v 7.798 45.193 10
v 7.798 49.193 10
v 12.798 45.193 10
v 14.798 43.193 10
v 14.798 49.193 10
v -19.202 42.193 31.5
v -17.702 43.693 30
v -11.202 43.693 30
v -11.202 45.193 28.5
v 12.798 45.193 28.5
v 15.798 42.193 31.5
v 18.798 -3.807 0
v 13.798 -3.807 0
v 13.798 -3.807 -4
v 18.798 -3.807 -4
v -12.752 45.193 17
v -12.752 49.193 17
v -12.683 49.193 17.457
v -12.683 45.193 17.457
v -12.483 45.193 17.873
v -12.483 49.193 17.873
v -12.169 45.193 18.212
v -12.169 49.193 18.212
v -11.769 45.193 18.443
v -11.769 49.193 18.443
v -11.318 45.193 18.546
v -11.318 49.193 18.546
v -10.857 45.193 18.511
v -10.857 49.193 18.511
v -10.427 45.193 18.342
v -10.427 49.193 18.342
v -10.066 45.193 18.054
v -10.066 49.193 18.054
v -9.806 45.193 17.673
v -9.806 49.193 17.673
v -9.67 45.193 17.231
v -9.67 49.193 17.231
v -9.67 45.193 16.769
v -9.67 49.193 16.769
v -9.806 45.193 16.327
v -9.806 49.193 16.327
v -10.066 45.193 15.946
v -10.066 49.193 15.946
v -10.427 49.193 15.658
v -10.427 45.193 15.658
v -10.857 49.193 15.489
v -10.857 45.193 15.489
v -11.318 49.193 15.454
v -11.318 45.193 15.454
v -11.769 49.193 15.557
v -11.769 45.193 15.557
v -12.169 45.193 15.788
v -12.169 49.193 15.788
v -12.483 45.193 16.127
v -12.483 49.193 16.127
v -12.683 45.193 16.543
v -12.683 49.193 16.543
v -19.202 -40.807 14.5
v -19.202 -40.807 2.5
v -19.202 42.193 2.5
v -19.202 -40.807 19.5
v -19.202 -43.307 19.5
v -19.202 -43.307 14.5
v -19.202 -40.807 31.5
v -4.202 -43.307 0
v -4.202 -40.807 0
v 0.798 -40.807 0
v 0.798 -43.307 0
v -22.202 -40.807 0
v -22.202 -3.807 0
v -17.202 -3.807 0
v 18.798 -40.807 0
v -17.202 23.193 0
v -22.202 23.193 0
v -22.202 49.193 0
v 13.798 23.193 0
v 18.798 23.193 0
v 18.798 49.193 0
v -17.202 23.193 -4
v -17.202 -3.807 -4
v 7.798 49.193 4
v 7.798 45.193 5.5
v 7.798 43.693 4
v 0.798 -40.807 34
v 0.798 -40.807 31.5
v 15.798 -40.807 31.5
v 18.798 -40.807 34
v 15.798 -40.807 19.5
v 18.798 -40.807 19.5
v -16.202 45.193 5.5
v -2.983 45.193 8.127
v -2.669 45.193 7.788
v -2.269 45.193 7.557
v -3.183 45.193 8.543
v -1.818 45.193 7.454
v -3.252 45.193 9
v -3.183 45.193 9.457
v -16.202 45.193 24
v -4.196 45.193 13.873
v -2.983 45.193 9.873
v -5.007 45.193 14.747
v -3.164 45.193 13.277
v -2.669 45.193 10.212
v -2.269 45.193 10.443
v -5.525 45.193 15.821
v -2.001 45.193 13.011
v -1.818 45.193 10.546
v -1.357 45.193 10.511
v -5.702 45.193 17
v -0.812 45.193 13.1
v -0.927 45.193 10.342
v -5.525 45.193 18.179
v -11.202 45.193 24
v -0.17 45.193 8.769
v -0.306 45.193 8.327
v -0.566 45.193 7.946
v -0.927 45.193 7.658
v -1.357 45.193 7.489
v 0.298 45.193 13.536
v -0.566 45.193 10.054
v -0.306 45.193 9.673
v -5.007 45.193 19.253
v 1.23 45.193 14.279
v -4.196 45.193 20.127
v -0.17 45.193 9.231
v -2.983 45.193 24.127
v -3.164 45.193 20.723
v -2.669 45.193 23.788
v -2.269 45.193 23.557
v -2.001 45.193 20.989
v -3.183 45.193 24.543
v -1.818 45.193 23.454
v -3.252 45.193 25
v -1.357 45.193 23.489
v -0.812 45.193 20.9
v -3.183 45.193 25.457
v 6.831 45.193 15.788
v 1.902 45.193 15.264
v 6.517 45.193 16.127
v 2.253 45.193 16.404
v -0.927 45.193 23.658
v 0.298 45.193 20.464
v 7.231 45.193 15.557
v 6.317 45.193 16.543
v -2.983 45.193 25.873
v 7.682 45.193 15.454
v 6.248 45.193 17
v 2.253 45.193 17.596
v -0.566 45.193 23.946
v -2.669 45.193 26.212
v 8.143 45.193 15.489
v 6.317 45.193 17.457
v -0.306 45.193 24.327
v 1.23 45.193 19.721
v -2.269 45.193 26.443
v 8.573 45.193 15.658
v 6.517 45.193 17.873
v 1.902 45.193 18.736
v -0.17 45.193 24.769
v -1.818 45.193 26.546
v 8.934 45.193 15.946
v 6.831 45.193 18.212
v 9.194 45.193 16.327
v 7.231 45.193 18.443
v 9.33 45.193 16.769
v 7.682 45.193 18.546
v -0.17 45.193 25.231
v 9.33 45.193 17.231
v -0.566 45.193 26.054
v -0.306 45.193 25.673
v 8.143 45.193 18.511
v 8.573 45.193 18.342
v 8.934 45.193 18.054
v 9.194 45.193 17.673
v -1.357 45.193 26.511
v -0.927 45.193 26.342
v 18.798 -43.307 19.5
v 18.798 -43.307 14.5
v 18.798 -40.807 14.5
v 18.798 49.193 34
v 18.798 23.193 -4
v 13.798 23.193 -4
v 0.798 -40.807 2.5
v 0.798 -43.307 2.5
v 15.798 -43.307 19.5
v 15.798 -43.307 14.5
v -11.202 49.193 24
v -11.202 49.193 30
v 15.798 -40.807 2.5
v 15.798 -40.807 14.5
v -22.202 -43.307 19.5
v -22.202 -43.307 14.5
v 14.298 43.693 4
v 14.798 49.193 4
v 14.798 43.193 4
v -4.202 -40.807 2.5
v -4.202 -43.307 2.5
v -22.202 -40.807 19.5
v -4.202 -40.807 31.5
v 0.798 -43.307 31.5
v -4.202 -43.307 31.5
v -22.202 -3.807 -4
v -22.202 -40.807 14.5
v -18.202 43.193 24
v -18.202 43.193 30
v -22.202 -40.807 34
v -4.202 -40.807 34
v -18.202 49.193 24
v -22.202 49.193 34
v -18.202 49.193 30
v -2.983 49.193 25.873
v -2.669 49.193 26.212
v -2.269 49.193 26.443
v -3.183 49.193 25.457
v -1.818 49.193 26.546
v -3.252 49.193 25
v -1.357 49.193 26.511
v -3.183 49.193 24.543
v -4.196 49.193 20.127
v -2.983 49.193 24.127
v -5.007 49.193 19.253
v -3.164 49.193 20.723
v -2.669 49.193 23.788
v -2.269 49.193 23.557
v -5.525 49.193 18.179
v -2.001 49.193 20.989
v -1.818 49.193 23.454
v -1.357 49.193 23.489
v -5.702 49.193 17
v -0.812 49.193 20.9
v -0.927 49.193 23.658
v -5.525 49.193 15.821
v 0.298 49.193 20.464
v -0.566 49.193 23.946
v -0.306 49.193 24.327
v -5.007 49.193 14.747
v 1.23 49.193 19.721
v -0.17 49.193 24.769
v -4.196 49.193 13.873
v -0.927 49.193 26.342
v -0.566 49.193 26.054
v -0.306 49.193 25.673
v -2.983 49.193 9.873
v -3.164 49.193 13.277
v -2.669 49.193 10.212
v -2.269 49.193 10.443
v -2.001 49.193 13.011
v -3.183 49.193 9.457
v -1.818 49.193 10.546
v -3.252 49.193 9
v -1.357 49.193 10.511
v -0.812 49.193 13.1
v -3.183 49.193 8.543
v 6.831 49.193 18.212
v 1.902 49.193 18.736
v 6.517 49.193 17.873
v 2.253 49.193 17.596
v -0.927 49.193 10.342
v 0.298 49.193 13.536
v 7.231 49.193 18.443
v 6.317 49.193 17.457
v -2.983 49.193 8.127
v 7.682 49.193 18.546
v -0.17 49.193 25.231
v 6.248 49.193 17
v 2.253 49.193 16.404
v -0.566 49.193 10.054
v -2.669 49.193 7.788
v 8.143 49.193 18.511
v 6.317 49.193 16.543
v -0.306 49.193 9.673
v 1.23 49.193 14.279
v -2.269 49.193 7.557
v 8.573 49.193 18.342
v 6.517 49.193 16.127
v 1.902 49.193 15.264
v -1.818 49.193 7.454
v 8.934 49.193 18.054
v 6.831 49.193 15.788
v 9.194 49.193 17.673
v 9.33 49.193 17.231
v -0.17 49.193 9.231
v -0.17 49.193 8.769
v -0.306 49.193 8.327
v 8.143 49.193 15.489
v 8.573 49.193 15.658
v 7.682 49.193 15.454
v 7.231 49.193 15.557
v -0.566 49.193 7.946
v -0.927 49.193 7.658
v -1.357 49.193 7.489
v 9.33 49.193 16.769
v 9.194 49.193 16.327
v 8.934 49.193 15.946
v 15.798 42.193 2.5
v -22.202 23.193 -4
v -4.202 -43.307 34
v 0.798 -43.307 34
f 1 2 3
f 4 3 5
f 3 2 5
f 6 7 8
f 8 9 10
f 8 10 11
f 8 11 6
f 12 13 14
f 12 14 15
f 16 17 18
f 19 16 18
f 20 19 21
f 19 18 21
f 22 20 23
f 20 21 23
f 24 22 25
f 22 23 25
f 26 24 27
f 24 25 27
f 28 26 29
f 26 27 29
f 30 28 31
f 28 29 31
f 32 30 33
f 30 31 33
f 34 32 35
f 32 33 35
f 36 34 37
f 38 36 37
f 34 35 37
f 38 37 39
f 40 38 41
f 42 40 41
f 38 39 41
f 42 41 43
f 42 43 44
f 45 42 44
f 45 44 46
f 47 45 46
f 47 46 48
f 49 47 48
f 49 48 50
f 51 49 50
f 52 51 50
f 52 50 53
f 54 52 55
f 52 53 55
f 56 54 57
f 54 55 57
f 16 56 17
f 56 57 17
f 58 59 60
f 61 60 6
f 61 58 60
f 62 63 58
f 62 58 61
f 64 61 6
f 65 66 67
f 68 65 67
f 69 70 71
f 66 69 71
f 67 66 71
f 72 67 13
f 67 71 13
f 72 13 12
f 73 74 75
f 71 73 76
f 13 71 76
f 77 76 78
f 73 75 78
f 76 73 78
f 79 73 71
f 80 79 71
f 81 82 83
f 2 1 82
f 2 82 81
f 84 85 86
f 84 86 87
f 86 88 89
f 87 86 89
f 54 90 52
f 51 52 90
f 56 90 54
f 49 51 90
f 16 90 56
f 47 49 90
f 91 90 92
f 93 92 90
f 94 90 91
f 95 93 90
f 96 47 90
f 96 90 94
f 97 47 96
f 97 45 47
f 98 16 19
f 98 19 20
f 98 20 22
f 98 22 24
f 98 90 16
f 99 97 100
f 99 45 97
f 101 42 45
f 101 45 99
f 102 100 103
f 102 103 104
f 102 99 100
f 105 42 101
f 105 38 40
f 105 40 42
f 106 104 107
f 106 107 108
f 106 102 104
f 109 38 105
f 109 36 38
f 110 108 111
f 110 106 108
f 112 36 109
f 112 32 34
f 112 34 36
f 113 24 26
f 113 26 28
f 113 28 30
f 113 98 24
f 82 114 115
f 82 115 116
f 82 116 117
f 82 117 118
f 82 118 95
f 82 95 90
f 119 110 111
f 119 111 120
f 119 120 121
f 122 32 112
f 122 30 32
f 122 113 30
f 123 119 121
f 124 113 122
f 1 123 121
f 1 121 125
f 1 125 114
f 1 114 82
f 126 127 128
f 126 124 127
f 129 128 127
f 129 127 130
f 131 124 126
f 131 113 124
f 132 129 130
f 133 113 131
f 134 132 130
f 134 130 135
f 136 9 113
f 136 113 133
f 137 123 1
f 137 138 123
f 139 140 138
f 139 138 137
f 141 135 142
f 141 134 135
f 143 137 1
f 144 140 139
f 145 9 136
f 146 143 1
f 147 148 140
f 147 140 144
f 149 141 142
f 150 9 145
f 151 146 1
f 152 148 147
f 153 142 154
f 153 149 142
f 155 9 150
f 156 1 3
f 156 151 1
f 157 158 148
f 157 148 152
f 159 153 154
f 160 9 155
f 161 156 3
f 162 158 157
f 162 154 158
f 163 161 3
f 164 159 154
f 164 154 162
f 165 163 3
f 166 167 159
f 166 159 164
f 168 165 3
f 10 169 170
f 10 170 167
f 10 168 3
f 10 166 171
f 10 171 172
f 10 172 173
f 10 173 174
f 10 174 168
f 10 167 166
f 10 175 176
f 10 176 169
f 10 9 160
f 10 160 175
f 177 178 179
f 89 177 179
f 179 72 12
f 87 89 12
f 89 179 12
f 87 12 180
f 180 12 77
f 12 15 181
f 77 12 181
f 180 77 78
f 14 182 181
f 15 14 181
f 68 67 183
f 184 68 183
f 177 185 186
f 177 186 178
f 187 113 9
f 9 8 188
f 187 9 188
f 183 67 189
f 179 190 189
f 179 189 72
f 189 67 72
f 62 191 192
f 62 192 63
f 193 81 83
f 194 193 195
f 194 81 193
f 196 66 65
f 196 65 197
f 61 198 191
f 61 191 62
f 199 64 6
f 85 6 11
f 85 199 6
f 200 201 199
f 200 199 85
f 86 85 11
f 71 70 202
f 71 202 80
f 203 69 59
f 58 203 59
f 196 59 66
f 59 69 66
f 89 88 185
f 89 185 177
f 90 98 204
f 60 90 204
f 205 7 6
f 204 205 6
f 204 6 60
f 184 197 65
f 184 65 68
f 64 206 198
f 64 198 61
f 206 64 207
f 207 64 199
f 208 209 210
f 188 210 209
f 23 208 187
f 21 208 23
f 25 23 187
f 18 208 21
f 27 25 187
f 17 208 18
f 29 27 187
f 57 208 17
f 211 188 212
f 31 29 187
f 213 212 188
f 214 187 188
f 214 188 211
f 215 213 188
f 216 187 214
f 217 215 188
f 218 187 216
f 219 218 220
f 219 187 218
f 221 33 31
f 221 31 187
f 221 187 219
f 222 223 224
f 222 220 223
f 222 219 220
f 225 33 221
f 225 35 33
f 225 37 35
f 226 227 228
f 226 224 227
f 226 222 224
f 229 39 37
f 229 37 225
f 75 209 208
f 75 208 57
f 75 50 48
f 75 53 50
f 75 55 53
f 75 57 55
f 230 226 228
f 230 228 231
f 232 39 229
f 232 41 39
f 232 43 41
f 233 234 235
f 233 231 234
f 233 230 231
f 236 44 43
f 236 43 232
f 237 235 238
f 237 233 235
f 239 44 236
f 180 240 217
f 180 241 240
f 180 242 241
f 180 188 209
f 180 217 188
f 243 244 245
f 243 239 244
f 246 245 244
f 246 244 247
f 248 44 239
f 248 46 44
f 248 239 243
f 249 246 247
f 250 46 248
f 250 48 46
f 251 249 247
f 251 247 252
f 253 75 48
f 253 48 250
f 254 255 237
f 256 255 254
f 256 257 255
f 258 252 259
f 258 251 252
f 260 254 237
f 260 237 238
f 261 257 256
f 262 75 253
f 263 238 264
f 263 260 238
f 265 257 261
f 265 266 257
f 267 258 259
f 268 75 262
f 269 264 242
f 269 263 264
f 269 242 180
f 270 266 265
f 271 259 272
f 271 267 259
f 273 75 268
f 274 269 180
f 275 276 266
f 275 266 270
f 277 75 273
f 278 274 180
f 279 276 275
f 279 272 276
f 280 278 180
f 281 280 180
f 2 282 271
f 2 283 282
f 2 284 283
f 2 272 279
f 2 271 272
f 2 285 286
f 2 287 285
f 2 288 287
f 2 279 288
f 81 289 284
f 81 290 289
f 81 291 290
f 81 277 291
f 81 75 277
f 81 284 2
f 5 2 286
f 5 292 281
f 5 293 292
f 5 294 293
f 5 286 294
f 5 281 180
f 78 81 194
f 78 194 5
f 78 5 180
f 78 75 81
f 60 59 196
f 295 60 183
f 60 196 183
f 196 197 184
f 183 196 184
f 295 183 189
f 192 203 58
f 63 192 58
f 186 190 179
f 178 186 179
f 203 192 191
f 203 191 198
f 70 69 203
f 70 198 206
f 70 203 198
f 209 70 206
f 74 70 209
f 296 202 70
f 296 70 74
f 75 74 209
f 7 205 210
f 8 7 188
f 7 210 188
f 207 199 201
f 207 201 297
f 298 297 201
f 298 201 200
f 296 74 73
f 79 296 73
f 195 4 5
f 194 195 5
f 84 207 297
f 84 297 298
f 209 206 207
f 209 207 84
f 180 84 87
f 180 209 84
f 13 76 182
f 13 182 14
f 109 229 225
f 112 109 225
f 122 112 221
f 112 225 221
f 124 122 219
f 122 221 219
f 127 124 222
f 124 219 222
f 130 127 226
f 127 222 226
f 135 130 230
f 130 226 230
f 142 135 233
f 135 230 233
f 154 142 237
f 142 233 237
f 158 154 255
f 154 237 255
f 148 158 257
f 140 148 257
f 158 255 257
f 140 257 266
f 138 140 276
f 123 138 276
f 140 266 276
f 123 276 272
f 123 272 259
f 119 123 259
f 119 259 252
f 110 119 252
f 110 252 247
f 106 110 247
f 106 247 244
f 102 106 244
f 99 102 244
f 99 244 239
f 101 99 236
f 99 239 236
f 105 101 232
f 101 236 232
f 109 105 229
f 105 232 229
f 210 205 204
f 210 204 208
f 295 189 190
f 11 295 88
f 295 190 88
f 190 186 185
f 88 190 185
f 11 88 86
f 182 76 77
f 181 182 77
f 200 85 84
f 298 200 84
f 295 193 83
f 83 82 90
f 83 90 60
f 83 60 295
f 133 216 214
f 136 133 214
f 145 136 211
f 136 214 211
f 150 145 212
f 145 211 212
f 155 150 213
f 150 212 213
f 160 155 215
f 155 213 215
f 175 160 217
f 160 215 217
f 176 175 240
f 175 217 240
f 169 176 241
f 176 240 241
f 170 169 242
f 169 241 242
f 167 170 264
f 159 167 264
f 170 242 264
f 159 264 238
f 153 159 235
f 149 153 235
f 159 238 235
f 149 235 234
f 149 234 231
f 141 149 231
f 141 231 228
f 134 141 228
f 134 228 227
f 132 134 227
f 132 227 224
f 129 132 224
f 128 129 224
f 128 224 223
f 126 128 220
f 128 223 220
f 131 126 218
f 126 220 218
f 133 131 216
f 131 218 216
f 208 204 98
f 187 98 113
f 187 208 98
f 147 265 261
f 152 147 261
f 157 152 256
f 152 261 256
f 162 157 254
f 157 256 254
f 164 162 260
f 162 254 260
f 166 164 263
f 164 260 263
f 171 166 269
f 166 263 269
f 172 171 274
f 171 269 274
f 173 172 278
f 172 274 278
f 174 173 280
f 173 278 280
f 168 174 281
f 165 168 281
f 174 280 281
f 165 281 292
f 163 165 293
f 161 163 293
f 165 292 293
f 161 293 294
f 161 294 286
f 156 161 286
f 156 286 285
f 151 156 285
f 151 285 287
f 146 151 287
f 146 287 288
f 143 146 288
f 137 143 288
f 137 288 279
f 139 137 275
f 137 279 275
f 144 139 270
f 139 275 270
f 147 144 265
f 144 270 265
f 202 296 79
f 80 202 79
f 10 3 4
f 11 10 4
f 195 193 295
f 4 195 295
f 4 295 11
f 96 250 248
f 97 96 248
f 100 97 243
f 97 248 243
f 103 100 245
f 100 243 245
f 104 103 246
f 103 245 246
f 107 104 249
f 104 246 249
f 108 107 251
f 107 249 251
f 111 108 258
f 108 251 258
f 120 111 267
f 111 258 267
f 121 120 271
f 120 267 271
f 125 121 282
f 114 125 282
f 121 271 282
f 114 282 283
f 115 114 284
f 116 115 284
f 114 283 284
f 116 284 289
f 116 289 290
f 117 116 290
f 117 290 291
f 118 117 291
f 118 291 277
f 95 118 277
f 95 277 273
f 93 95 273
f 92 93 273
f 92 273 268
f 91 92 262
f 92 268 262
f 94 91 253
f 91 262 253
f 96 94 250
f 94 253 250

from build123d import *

# Parameters (mm, degrees)
F0_W           = 41
F0_H           = 90
F1_DEPTH       = 34
F2_W           = 35
F2_H           = 29
F3_DEPTH       = 86
F4_W           = 7
F4_H           = 6
F4_R           = 1.55
F4_R_2         = 4
F5_DEPTH       = 4
F6_W           = 5
F6_H           = 2.5
F6_W_2         = 3
F6_H_2         = 5
F7_DEPTH       = 2.5
F8_W           = 5
F8_H           = 27
F9_DEPTH       = 4
F10_T4_DEPTH   = 29
F10_T10_DEPTH  = 29
F10_T16_DEPTH  = 29
F10_T23_DEPTH  = 29
F10_T29_DEPTH  = 29
F10_T35_DEPTH  = 29
F10_T41_DEPTH  = 29
F10_T47_DEPTH  = 29
F10_T54_DEPTH  = 29
F10_T60_DEPTH  = 29
F10_T66_DEPTH  = 35
F10_T72_DEPTH  = 35
F10_T78_DEPTH  = 35
F10_T85_DEPTH  = 35
F10_T91_DEPTH  = 35
F10_T97_DEPTH  = 35
F10_T103_DEPTH = 35
F10_T109_DEPTH = 35
F10_T116_DEPTH = 35
F10_T122_DEPTH = 35


# Not quite as in the source:
# - a fillet or chamfer that OpenCascade refuses, or shapes differently, is made with other operations: its cross-section is extruded or revolved along the edge and cut away or added


with BuildPart() as f1:
    # F0 (on Top) → F1 (new body)
    with BuildSketch(Plane.XY):
        with Locations((-1.7023412511, 4.193077401)):
            Rectangle(F0_W, F0_H)
    extrude(amount=F1_DEPTH)

    # F2 (on face) → F3 (cut)
    with BuildSketch(Plane.XZ.offset(40.806922599)):
        with Locations((-1.7023412511, 17)):
            Rectangle(F2_W, F2_H)
    extrude(amount=-F3_DEPTH, mode=Mode.SUBTRACT)

    # F4 (on face) → F5 (cut, through all)
    with BuildSketch(Plane(origin=(0, 49.193077401, 0), x_dir=(-1, 0, 0), z_dir=(0, 1, 0))):
        with Locations((-11.2976587489, 7)):
            Rectangle(F4_W, F4_H)
        with Locations((-7.7976587489, 17)):
            Circle(F4_R)
        with Locations((1.7023412511, 25)):
            Circle(F4_R)
        with Locations((1.7023412511, 17)):
            Circle(F4_R_2)
        with Locations((1.7023412511, 9)):
            Circle(F4_R)
        with Locations((11.2023412511, 17)):
            Circle(F4_R)
        with Locations((14.7023412511, 27)):
            Rectangle(F4_W, F4_H)
    extrude(amount=-F5_DEPTH, mode=Mode.SUBTRACT)

    # F6 (on face) → F7 (join)
    with BuildSketch(Plane.XZ.offset(40.806922599)):
        with Locations((-1.7023412511, 32.75)):
            Rectangle(F6_W, F6_H)
        with Locations((-20.7023412511, 17)):
            Rectangle(F6_W_2, F6_H_2)
        with Locations((17.2976587489, 17)):
            Rectangle(F6_W_2, F6_H_2)
        with Locations((-1.7023412511, 1.25)):
            Rectangle(F6_W, F6_H)
    extrude(amount=F7_DEPTH)

    # F8 (on face) → F9 (join)
    with BuildSketch(Plane(origin=(0, 0, 0), x_dir=(1, 0, 0), z_dir=(0, 0, -1))):
        with Locations((-19.7023412511, -9.693077401)):
            Rectangle(F8_W, F8_H)
        with Locations((16.2976587489, -9.693077401)):
            Rectangle(F8_W, F8_H)
    extrude(amount=F9_DEPTH)

    # F10: chamfer of 3 on 4 edges, made by hand


with BuildPart() as f10_tool2:
    # F10_s3 → F10_t4 (new body)
    with BuildSketch(Plane.XY.offset(31.5)):
        Polygon((-16.2023412511, 45.193077401), (-19.2023412511, 42.193077401), (-19.2023412511, 45.193077401), align=None)
    extrude(amount=-F10_T4_DEPTH)

    split(bisect_by=Plane.YZ.offset(-18.2023412511), keep=Keep.TOP)

    split(bisect_by=Plane.XY.offset(30), keep=Keep.TOP)


with BuildPart() as f1_1:
    add(f1.part)

    # F10_t1: union F10_tool2
    add(f10_tool2.part)


with BuildPart() as f10_tool8:
    # F10_s9 → F10_t10 (new body)
    with BuildSketch(Plane.XY.offset(31.5)):
        Polygon((-16.2023412511, 45.193077401), (-19.2023412511, 42.193077401), (-19.2023412511, 45.193077401), align=None)
    extrude(amount=-F10_T10_DEPTH)

    split(bisect_by=Plane.YZ.offset(-18.2023412511), keep=Keep.BOTTOM)

    split(bisect_by=Plane.XY.offset(30), keep=Keep.TOP)


with BuildPart() as f1_2:
    add(f1_1.part)

    # F10_t7: union F10_tool8
    add(f10_tool8.part)


with BuildPart() as f10_tool14:
    # F10_s15 → F10_t16 (new body)
    with BuildSketch(Plane.XY.offset(31.5)):
        Polygon((-16.2023412511, 45.193077401), (-19.2023412511, 42.193077401), (-19.2023412511, 45.193077401), align=None)
    extrude(amount=-F10_T16_DEPTH)

    split(bisect_by=Plane.YZ.offset(-18.2023412511), keep=Keep.BOTTOM)

    split(bisect_by=Plane.XY.offset(24), keep=Keep.TOP)

    split(bisect_by=Plane.XY.offset(30), keep=Keep.BOTTOM)


with BuildPart() as f1_3:
    add(f1_2.part)

    # F10_t13: union F10_tool14
    add(f10_tool14.part)


with BuildPart() as f10_tool21:
    # F10_s22 → F10_t23 (new body)
    with BuildSketch(Plane.XY.offset(31.5)):
        Polygon((-16.2023412511, 45.193077401), (-19.2023412511, 42.193077401), (-19.2023412511, 45.193077401), align=None)
    extrude(amount=-F10_T23_DEPTH)

    split(bisect_by=Plane.YZ.offset(-18.2023412511), keep=Keep.TOP)

    split(bisect_by=Plane.XY.offset(24), keep=Keep.BOTTOM)


with BuildPart() as f1_4:
    add(f1_3.part)

    # F10_t20: union F10_tool21
    add(f10_tool21.part)


with BuildPart() as f10_tool27:
    # F10_s28 → F10_t29 (new body)
    with BuildSketch(Plane.XY.offset(31.5)):
        Polygon((-16.2023412511, 45.193077401), (-19.2023412511, 42.193077401), (-19.2023412511, 45.193077401), align=None)
    extrude(amount=-F10_T29_DEPTH)

    split(bisect_by=Plane.YZ.offset(-18.2023412511), keep=Keep.BOTTOM)

    split(bisect_by=Plane.XY.offset(24), keep=Keep.BOTTOM)


with BuildPart() as f1_5:
    add(f1_4.part)

    # F10_t26: union F10_tool27
    add(f10_tool27.part)


with BuildPart() as f10_tool33:
    # F10_s34 → F10_t35 (new body)
    with BuildSketch(Plane.XY.offset(2.5)):
        Polygon((12.7976587489, 45.193077401), (15.7976587489, 42.193077401), (15.7976587489, 45.193077401), align=None)
    extrude(amount=F10_T35_DEPTH)

    split(bisect_by=Plane.XY.offset(4), keep=Keep.BOTTOM)

    split(bisect_by=Plane.YZ.offset(14.7976587489), keep=Keep.BOTTOM)


with BuildPart() as f1_6:
    add(f1_5.part)

    # F10_t32: union F10_tool33
    add(f10_tool33.part)


with BuildPart() as f10_tool39:
    # F10_s40 → F10_t41 (new body)
    with BuildSketch(Plane.XY.offset(2.5)):
        Polygon((12.7976587489, 45.193077401), (15.7976587489, 42.193077401), (15.7976587489, 45.193077401), align=None)
    extrude(amount=F10_T41_DEPTH)

    split(bisect_by=Plane.XY.offset(4), keep=Keep.BOTTOM)

    split(bisect_by=Plane.YZ.offset(14.7976587489), keep=Keep.TOP)


with BuildPart() as f1_7:
    add(f1_6.part)

    # F10_t38: union F10_tool39
    add(f10_tool39.part)


with BuildPart() as f10_tool45:
    # F10_s46 → F10_t47 (new body)
    with BuildSketch(Plane.XY.offset(2.5)):
        Polygon((12.7976587489, 45.193077401), (15.7976587489, 42.193077401), (15.7976587489, 45.193077401), align=None)
    extrude(amount=F10_T47_DEPTH)

    split(bisect_by=Plane.XY.offset(4), keep=Keep.TOP)

    split(bisect_by=Plane.YZ.offset(14.7976587489), keep=Keep.TOP)

    split(bisect_by=Plane.XY.offset(10), keep=Keep.BOTTOM)


with BuildPart() as f1_8:
    add(f1_7.part)

    # F10_t44: union F10_tool45
    add(f10_tool45.part)


with BuildPart() as f10_tool52:
    # F10_s53 → F10_t54 (new body)
    with BuildSketch(Plane.XY.offset(2.5)):
        Polygon((12.7976587489, 45.193077401), (15.7976587489, 42.193077401), (15.7976587489, 45.193077401), align=None)
    extrude(amount=F10_T54_DEPTH)

    split(bisect_by=Plane.YZ.offset(14.7976587489), keep=Keep.BOTTOM)

    split(bisect_by=Plane.XY.offset(10), keep=Keep.TOP)


with BuildPart() as f1_9:
    add(f1_8.part)

    # F10_t51: union F10_tool52
    add(f10_tool52.part)


with BuildPart() as f10_tool58:
    # F10_s59 → F10_t60 (new body)
    with BuildSketch(Plane.XY.offset(2.5)):
        Polygon((12.7976587489, 45.193077401), (15.7976587489, 42.193077401), (15.7976587489, 45.193077401), align=None)
    extrude(amount=F10_T60_DEPTH)

    split(bisect_by=Plane.YZ.offset(14.7976587489), keep=Keep.TOP)

    split(bisect_by=Plane.XY.offset(10), keep=Keep.TOP)


with BuildPart() as f1_10:
    add(f1_9.part)

    # F10_t57: union F10_tool58
    add(f10_tool58.part)


with BuildPart() as f10_tool64:
    # F10_s65 → F10_t66 (new body)
    with BuildSketch(Plane.YZ.offset(15.7976587489)):
        Polygon((45.193077401, 28.5), (42.193077401, 31.5), (45.193077401, 31.5), align=None)
    extrude(amount=-F10_T66_DEPTH)

    split(bisect_by=Plane.YZ.offset(-11.2023412511), keep=Keep.TOP)

    split(bisect_by=Plane.XY.offset(30), keep=Keep.BOTTOM)


with BuildPart() as f1_11:
    add(f1_10.part)

    # F10_t63: union F10_tool64
    add(f10_tool64.part)


with BuildPart() as f10_tool70:
    # F10_s71 → F10_t72 (new body)
    with BuildSketch(Plane.YZ.offset(15.7976587489)):
        Polygon((45.193077401, 28.5), (42.193077401, 31.5), (45.193077401, 31.5), align=None)
    extrude(amount=-F10_T72_DEPTH)

    split(bisect_by=Plane.YZ.offset(-11.2023412511), keep=Keep.TOP)

    split(bisect_by=Plane.XY.offset(30), keep=Keep.TOP)


with BuildPart() as f1_12:
    add(f1_11.part)

    # F10_t69: union F10_tool70
    add(f10_tool70.part)


with BuildPart() as f10_tool76:
    # F10_s77 → F10_t78 (new body)
    with BuildSketch(Plane.YZ.offset(15.7976587489)):
        Polygon((45.193077401, 28.5), (42.193077401, 31.5), (45.193077401, 31.5), align=None)
    extrude(amount=-F10_T78_DEPTH)

    split(bisect_by=Plane.YZ.offset(-18.2023412511), keep=Keep.TOP)

    split(bisect_by=Plane.YZ.offset(-11.2023412511), keep=Keep.BOTTOM)

    split(bisect_by=Plane.XY.offset(30), keep=Keep.TOP)


with BuildPart() as f1_13:
    add(f1_12.part)

    # F10_t75: union F10_tool76
    add(f10_tool76.part)


with BuildPart() as f10_tool83:
    # F10_s84 → F10_t85 (new body)
    with BuildSketch(Plane.YZ.offset(15.7976587489)):
        Polygon((45.193077401, 28.5), (42.193077401, 31.5), (45.193077401, 31.5), align=None)
    extrude(amount=-F10_T85_DEPTH)

    split(bisect_by=Plane.YZ.offset(-18.2023412511), keep=Keep.BOTTOM)

    split(bisect_by=Plane.XY.offset(30), keep=Keep.BOTTOM)


with BuildPart() as f1_14:
    add(f1_13.part)

    # F10_t82: union F10_tool83
    add(f10_tool83.part)


with BuildPart() as f10_tool89:
    # F10_s90 → F10_t91 (new body)
    with BuildSketch(Plane.YZ.offset(15.7976587489)):
        Polygon((45.193077401, 28.5), (42.193077401, 31.5), (45.193077401, 31.5), align=None)
    extrude(amount=-F10_T91_DEPTH)

    split(bisect_by=Plane.YZ.offset(-18.2023412511), keep=Keep.BOTTOM)

    split(bisect_by=Plane.XY.offset(30), keep=Keep.TOP)


with BuildPart() as f1_15:
    add(f1_14.part)

    # F10_t88: union F10_tool89
    add(f10_tool89.part)


with BuildPart() as f10_tool95:
    # F10_s96 → F10_t97 (new body)
    with BuildSketch(Plane.YZ.offset(-19.2023412511)):
        Polygon((45.193077401, 5.5), (42.193077401, 2.5), (45.193077401, 2.5), align=None)
    extrude(amount=F10_T97_DEPTH)

    split(bisect_by=Plane.YZ.offset(7.7976587489), keep=Keep.BOTTOM)

    split(bisect_by=Plane.XY.offset(4), keep=Keep.TOP)


with BuildPart() as f1_16:
    add(f1_15.part)

    # F10_t94: union F10_tool95
    add(f10_tool95.part)


with BuildPart() as f10_tool101:
    # F10_s102 → F10_t103 (new body)
    with BuildSketch(Plane.YZ.offset(-19.2023412511)):
        Polygon((45.193077401, 5.5), (42.193077401, 2.5), (45.193077401, 2.5), align=None)
    extrude(amount=F10_T103_DEPTH)

    split(bisect_by=Plane.YZ.offset(7.7976587489), keep=Keep.BOTTOM)

    split(bisect_by=Plane.XY.offset(4), keep=Keep.BOTTOM)


with BuildPart() as f1_17:
    add(f1_16.part)

    # F10_t100: union F10_tool101
    add(f10_tool101.part)


with BuildPart() as f10_tool107:
    # F10_s108 → F10_t109 (new body)
    with BuildSketch(Plane.YZ.offset(-19.2023412511)):
        Polygon((45.193077401, 5.5), (42.193077401, 2.5), (45.193077401, 2.5), align=None)
    extrude(amount=F10_T109_DEPTH)

    split(bisect_by=Plane.YZ.offset(7.7976587489), keep=Keep.TOP)

    split(bisect_by=Plane.XY.offset(4), keep=Keep.BOTTOM)

    split(bisect_by=Plane.YZ.offset(14.7976587489), keep=Keep.BOTTOM)


with BuildPart() as f1_18:
    add(f1_17.part)

    # F10_t106: union F10_tool107
    add(f10_tool107.part)


with BuildPart() as f10_tool114:
    # F10_s115 → F10_t116 (new body)
    with BuildSketch(Plane.YZ.offset(-19.2023412511)):
        Polygon((45.193077401, 5.5), (42.193077401, 2.5), (45.193077401, 2.5), align=None)
    extrude(amount=F10_T116_DEPTH)

    split(bisect_by=Plane.XY.offset(4), keep=Keep.TOP)

    split(bisect_by=Plane.YZ.offset(14.7976587489), keep=Keep.TOP)


with BuildPart() as f1_19:
    add(f1_18.part)

    # F10_t113: union F10_tool114
    add(f10_tool114.part)


with BuildPart() as f10_tool120:
    # F10_s121 → F10_t122 (new body)
    with BuildSketch(Plane.YZ.offset(-19.2023412511)):
        Polygon((45.193077401, 5.5), (42.193077401, 2.5), (45.193077401, 2.5), align=None)
    extrude(amount=F10_T122_DEPTH)

    split(bisect_by=Plane.XY.offset(4), keep=Keep.BOTTOM)

    split(bisect_by=Plane.YZ.offset(14.7976587489), keep=Keep.TOP)


with BuildPart() as f1_20:
    add(f1_19.part)

    # F10_t119: union F10_tool120
    add(f10_tool120.part)


solid = f1_20.part
